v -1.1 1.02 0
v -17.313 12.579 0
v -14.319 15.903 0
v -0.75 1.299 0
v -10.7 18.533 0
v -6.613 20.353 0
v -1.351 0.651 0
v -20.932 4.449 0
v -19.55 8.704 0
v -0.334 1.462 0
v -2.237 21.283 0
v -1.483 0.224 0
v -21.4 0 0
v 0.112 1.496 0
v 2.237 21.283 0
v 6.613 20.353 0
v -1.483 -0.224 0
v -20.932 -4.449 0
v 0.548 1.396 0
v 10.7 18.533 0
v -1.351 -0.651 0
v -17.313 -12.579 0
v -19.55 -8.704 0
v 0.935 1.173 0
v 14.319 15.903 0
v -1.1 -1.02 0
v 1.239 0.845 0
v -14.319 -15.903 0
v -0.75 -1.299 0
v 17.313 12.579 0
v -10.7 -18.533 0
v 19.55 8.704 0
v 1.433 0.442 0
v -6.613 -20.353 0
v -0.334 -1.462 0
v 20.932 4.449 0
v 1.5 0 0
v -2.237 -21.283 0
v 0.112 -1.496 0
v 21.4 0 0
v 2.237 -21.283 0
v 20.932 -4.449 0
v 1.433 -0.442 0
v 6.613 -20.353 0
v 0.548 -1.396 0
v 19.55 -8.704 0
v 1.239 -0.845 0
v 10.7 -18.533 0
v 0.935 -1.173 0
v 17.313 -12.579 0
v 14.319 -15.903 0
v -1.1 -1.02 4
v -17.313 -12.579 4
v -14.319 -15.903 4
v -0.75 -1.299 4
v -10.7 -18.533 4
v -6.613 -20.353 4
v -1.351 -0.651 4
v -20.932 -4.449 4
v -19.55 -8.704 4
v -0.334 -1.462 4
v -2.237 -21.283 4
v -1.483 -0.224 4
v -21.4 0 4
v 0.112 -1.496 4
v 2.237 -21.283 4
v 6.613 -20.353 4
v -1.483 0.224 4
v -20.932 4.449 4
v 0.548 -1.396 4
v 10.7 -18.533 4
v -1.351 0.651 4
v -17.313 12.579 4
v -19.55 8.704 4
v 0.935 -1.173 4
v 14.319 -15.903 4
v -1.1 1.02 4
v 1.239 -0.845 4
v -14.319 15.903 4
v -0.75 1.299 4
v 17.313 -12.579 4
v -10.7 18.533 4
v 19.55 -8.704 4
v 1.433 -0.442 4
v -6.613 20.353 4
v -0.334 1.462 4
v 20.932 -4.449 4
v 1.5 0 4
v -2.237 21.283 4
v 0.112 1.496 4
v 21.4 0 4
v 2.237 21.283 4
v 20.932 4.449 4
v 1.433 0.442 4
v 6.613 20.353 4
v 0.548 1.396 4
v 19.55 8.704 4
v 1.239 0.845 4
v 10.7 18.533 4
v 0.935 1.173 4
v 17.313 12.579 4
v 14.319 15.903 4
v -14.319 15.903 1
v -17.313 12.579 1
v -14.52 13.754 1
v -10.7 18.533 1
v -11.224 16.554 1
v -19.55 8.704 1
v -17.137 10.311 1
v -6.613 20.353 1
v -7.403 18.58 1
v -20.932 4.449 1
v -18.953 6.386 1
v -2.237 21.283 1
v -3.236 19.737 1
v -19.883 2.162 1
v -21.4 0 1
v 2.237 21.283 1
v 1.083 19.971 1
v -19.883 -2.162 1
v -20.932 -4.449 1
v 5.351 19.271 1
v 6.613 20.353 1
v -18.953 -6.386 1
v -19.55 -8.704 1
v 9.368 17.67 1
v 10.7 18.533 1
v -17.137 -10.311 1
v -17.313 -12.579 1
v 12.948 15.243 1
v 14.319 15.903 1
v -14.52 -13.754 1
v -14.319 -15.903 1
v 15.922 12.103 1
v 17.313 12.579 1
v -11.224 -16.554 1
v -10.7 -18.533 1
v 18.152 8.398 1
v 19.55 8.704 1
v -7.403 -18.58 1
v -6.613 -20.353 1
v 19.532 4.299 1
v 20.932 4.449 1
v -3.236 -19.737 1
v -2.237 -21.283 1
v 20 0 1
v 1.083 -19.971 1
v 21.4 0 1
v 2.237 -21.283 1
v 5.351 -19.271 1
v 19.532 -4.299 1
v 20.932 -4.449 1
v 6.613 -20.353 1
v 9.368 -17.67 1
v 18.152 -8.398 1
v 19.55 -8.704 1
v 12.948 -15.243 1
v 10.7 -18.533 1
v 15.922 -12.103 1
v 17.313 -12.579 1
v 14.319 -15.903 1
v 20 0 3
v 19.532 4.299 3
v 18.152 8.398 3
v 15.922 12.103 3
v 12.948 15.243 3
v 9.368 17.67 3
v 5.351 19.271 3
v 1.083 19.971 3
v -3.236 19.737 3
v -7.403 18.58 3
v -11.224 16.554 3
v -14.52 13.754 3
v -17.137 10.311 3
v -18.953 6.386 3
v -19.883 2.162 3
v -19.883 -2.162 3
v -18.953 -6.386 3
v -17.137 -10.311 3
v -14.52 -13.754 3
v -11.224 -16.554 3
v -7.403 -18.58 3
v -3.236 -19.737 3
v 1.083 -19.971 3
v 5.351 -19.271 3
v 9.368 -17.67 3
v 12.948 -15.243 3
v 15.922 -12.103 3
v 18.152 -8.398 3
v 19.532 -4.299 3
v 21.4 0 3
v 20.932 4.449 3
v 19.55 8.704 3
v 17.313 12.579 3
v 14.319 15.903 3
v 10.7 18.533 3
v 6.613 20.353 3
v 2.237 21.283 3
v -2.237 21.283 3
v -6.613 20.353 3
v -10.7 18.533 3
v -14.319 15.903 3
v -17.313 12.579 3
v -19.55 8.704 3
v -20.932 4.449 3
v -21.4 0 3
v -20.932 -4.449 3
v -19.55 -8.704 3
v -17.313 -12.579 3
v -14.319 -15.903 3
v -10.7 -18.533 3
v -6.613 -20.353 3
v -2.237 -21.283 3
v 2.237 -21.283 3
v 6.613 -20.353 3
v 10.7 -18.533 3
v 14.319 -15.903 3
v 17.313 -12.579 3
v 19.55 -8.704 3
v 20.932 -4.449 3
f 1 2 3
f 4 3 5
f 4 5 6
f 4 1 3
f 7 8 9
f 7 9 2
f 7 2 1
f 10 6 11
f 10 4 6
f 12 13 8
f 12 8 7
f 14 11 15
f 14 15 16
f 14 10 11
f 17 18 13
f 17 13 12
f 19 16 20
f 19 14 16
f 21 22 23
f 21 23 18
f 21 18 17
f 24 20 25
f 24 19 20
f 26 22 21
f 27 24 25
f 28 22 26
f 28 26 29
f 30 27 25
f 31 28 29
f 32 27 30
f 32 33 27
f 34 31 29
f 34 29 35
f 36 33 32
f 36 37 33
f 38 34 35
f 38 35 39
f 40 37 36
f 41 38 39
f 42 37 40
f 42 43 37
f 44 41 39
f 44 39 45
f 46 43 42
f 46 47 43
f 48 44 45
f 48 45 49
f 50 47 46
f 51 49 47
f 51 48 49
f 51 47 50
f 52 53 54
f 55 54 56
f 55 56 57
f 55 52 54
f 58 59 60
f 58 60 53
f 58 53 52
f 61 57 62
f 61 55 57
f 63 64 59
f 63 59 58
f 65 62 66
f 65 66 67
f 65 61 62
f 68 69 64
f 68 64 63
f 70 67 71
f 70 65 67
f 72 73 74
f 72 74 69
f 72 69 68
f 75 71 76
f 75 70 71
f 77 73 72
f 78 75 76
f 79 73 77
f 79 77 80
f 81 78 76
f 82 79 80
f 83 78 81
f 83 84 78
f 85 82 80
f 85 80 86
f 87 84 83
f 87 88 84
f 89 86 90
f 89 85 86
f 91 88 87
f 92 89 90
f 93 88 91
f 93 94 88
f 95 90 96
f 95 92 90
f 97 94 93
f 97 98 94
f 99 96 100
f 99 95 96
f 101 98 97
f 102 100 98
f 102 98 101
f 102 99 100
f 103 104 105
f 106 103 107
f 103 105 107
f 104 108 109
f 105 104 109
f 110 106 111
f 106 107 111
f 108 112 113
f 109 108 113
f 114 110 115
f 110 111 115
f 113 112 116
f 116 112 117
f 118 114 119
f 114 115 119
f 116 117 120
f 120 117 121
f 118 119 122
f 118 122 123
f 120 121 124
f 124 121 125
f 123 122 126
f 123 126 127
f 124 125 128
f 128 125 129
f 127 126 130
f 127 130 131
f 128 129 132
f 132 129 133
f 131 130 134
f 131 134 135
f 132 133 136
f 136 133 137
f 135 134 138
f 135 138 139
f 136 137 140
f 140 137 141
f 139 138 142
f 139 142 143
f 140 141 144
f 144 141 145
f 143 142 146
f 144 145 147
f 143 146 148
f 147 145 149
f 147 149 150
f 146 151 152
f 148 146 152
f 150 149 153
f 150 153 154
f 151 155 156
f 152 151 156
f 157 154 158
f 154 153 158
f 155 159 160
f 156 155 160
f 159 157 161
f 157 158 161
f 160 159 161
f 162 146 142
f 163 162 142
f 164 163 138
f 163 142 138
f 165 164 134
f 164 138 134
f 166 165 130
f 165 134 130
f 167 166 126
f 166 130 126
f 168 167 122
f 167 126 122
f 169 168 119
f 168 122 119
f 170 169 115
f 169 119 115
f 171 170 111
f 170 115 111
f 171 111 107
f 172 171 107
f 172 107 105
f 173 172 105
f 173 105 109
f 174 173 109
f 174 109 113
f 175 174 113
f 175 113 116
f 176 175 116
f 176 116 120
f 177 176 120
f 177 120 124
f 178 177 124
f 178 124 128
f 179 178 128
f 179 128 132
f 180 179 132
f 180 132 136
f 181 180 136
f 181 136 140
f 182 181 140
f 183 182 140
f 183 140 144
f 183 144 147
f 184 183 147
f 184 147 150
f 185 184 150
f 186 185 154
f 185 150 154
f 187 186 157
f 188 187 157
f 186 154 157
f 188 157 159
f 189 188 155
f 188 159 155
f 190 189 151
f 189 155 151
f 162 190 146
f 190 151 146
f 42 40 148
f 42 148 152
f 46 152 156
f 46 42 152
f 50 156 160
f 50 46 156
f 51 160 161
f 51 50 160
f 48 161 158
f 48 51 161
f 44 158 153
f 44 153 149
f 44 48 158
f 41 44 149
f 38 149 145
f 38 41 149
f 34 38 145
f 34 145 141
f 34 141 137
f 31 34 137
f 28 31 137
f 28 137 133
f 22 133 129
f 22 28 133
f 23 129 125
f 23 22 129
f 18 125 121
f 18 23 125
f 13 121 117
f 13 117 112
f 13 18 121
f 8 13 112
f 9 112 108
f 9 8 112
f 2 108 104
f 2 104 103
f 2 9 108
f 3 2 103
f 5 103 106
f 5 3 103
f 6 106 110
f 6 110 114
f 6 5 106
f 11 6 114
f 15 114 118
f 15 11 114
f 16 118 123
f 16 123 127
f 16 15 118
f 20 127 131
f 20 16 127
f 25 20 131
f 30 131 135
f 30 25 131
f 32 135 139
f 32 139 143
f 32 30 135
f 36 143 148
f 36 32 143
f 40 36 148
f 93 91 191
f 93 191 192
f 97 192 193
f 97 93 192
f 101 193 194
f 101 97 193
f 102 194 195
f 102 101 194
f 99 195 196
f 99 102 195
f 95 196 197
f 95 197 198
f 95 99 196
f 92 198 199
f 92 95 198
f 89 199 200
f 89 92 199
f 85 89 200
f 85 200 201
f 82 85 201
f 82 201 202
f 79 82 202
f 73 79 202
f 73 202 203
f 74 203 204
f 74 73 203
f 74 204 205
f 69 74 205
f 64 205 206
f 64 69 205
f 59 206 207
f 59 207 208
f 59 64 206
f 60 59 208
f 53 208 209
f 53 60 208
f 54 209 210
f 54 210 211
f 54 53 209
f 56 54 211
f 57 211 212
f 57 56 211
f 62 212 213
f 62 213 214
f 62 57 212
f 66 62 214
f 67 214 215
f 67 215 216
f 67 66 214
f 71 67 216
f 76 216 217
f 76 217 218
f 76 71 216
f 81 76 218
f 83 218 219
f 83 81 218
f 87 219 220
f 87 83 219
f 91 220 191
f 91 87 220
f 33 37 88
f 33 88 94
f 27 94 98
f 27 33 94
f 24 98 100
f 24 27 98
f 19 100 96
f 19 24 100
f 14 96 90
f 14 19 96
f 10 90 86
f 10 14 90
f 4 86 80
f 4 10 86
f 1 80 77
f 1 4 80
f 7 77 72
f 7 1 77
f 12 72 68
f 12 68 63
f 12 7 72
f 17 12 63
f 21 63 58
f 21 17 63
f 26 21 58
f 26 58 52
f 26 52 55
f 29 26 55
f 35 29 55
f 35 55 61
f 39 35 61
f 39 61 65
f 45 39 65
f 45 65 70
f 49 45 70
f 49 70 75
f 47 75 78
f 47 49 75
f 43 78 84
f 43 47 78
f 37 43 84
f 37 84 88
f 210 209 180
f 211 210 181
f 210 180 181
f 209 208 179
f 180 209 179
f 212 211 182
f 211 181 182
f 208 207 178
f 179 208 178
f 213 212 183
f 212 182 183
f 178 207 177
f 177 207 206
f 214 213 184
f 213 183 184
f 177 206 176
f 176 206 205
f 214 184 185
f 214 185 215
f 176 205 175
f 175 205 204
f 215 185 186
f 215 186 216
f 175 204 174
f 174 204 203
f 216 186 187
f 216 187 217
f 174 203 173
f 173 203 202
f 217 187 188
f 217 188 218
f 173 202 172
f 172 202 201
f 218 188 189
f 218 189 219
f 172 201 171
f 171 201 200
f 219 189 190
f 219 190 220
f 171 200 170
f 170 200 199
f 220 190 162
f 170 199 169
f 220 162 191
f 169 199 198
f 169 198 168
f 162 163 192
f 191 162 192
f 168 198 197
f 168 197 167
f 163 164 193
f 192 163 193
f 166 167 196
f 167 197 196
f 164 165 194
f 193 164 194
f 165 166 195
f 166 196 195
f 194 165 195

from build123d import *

# Parameters (mm, degrees)
F0_R     = 20
F0_R_2   = 1.5
F1_DEPTH = 4
F2_R     = 21.4
F2_R_2   = 20
F3_DEPTH = 1
F4_R     = 21.4
F4_R_2   = 20
F5_DEPTH = 1


with BuildPart() as f1:
    # F0 (on Top) → F1 (new body)
    with BuildSketch(Plane.XY):
        Circle(F0_R)
        Circle(F0_R_2, mode=Mode.SUBTRACT)
    extrude(amount=F1_DEPTH)

    # F2 (on face) → F3 (join)
    with BuildSketch(Plane.XY.offset(4)):
        Circle(F2_R)
        Circle(F2_R_2, mode=Mode.SUBTRACT)
    extrude(amount=-F3_DEPTH)

    # F4 (on face) → F5 (join)
    with BuildSketch(Plane(origin=(0, 0, 0), x_dir=(1, 0, 0), z_dir=(0, 0, -1))):
        Circle(F4_R)
        Circle(F4_R_2, mode=Mode.SUBTRACT)
    extrude(amount=-F5_DEPTH)


solid = f1.part
